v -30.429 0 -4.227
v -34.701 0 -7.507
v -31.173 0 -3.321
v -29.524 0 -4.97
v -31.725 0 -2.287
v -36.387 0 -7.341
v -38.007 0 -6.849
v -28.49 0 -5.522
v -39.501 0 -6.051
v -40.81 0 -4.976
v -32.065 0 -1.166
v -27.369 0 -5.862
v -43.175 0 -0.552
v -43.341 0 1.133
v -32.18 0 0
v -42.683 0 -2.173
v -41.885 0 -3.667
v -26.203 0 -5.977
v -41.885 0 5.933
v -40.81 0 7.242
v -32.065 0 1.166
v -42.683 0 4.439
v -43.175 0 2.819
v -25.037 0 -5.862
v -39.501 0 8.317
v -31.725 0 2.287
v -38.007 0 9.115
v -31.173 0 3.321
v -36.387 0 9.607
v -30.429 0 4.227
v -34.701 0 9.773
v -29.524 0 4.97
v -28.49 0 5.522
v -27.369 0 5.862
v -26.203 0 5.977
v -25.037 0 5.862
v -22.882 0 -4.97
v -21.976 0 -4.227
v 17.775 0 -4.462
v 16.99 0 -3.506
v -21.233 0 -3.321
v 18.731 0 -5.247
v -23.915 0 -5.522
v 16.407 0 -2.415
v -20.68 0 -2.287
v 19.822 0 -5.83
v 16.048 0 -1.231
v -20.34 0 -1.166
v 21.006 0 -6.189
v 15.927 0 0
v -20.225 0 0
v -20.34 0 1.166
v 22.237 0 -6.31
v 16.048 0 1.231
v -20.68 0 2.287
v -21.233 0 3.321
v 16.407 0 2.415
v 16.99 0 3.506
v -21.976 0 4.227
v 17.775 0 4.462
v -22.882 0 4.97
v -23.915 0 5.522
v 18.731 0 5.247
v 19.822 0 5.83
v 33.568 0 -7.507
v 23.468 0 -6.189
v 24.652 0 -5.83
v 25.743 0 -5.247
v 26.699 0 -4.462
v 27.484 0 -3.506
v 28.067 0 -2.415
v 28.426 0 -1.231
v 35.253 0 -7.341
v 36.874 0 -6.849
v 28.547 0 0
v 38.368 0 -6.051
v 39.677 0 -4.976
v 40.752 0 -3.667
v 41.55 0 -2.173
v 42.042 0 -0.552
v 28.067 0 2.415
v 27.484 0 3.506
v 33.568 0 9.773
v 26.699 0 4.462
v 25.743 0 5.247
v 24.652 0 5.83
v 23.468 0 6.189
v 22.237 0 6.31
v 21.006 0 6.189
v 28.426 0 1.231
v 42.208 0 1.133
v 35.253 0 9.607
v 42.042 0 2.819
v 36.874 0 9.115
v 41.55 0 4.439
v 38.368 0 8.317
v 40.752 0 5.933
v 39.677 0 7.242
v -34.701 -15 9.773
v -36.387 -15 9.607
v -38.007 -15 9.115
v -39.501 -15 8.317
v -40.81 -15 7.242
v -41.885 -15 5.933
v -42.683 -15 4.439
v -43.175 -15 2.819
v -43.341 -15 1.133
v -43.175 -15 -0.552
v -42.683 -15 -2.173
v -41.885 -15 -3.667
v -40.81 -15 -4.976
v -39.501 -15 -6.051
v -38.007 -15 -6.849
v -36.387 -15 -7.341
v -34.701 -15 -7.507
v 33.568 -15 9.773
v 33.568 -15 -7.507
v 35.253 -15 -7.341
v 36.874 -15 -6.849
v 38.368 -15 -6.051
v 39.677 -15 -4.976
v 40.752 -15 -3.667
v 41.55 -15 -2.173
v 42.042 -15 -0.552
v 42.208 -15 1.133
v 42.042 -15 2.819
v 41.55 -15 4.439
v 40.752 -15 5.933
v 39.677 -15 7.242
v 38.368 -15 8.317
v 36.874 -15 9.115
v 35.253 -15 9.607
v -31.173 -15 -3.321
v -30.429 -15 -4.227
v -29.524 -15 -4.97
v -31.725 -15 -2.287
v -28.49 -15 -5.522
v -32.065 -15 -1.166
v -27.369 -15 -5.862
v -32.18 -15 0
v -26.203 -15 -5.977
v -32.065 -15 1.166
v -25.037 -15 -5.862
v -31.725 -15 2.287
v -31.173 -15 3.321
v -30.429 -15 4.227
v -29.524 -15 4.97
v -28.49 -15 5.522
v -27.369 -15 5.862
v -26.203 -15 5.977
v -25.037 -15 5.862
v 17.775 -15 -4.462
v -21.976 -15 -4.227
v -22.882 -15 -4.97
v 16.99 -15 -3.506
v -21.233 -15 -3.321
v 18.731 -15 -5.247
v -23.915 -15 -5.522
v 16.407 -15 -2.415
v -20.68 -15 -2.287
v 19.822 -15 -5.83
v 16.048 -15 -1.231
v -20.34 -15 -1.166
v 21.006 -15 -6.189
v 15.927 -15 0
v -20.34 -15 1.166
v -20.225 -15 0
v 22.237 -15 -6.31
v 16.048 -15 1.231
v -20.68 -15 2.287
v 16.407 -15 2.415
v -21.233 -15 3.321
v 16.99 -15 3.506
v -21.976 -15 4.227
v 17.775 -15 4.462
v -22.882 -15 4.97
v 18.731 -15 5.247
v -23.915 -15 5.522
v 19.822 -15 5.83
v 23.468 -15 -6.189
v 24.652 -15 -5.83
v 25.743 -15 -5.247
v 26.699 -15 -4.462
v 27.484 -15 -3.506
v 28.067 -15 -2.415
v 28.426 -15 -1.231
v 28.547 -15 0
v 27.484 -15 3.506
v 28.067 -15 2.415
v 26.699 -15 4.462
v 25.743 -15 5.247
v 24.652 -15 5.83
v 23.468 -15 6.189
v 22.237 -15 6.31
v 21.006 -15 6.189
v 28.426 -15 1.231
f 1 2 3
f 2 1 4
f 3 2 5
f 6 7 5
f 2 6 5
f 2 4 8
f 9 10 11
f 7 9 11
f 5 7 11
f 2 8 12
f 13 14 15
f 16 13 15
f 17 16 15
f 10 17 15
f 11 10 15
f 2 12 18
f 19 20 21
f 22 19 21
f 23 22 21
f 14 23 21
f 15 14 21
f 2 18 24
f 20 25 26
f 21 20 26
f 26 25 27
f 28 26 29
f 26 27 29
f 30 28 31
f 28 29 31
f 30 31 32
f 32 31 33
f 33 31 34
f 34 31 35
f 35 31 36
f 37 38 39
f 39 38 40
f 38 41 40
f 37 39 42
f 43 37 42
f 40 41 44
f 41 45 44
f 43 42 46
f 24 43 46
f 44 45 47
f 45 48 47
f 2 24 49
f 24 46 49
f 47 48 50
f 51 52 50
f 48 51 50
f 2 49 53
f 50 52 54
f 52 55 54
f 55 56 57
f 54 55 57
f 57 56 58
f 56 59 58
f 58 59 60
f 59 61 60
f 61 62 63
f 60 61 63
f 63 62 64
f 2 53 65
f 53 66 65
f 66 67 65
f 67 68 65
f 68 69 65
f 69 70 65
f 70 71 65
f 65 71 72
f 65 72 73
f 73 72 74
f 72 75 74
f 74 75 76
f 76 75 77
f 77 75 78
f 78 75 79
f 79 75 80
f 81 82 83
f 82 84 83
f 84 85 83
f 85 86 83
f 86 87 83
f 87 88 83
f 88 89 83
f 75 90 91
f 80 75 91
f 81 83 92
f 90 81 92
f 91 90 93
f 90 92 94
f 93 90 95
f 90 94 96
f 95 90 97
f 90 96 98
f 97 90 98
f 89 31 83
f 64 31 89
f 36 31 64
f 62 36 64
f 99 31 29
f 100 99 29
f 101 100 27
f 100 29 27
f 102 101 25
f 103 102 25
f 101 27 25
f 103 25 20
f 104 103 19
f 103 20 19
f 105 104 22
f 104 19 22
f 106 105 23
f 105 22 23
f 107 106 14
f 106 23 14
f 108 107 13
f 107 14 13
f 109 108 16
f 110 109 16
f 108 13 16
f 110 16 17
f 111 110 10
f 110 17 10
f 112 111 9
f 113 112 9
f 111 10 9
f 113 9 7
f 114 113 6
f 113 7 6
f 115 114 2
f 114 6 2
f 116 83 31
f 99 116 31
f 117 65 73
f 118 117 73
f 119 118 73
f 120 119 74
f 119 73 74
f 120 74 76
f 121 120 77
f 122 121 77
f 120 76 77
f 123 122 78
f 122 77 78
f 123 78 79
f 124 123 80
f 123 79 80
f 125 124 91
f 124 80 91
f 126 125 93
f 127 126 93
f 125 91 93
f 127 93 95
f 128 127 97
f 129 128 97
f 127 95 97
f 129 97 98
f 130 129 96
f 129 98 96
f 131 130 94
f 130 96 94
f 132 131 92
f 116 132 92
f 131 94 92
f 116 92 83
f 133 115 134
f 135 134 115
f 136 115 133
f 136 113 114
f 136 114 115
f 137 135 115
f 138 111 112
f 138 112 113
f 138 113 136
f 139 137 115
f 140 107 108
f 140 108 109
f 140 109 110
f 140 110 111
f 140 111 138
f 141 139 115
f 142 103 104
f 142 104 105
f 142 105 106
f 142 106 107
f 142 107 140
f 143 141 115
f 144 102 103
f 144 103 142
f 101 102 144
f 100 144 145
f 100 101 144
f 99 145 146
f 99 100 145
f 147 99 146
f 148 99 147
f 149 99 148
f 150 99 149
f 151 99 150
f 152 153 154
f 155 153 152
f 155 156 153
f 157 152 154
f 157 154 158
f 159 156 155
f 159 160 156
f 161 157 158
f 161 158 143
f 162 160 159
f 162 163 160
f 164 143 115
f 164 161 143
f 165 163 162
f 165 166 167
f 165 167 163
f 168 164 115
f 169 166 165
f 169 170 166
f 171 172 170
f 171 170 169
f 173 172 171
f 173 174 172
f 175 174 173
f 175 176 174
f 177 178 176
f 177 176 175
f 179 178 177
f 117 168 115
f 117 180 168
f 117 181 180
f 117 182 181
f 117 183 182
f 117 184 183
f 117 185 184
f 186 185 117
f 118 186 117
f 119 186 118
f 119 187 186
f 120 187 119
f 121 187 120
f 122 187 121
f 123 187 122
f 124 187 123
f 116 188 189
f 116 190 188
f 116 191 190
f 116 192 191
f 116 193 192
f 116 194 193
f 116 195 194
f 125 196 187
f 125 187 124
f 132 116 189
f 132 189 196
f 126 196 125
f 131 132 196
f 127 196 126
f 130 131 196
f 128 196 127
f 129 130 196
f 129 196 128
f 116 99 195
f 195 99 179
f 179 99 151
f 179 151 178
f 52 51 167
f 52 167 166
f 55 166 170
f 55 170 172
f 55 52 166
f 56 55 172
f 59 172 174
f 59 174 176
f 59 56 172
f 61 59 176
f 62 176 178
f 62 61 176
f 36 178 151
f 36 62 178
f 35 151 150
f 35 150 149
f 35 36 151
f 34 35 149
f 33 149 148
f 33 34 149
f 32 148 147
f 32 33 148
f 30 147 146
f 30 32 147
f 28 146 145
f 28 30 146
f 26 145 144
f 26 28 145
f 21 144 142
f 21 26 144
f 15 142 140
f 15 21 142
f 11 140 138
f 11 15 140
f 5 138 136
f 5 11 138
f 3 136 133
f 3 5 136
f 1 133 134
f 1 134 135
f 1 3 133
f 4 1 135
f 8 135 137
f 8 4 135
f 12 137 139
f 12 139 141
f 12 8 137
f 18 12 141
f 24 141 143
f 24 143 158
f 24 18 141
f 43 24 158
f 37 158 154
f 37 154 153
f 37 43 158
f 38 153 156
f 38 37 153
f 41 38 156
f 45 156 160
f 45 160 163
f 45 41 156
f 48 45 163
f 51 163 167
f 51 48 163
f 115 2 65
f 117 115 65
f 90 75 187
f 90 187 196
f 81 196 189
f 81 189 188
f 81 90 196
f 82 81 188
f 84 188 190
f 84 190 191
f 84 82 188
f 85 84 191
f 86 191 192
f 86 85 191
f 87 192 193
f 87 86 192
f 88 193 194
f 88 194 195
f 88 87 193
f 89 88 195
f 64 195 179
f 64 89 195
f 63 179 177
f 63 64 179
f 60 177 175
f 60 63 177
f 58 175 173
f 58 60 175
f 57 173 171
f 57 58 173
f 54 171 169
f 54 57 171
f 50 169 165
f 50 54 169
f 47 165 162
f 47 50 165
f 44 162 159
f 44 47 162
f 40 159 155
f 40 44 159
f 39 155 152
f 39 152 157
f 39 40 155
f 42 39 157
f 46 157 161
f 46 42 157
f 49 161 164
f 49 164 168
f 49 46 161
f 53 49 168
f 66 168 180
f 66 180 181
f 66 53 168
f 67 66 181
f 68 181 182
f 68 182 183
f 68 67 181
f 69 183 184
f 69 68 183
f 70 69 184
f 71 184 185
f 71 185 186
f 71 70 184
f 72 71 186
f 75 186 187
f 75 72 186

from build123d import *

# Parameters (mm, degrees)
F0_R     = 5.977337
F0_R_2   = 6.310388
F1_DEPTH = 15


with BuildPart() as f1:
    # F0 (on Front) → F1 (new body)
    with BuildSketch(Plane.XZ):
        Polygon((33.567898, 9.772932), (0, 9.772932), (-34.70099, 9.772932), (-34.70099, -7.506745), (33.567898, -7.506745), align=None)
        with Locations((-26.202789, 0)):
            Circle(F0_R, mode=Mode.SUBTRACT)
        with Locations((22.23696, 0)):
            Circle(F0_R_2, mode=Mode.SUBTRACT)
        with BuildLine():
            Line((-34.70099, -7.506745), (-34.70099, 9.772932))
            ThreePointArc((-34.70099, 9.772932), (-43.340828, 1.133094), (-34.70099, -7.506745))
        make_face()
        with BuildLine():
            ThreePointArc((33.567898, -7.506745), (42.207737, 1.133094), (33.567898, 9.772932))
            Line((33.567898, 9.772932), (33.567898, -7.506745))
        make_face()
    extrude(amount=F1_DEPTH)


solid = f1.part
